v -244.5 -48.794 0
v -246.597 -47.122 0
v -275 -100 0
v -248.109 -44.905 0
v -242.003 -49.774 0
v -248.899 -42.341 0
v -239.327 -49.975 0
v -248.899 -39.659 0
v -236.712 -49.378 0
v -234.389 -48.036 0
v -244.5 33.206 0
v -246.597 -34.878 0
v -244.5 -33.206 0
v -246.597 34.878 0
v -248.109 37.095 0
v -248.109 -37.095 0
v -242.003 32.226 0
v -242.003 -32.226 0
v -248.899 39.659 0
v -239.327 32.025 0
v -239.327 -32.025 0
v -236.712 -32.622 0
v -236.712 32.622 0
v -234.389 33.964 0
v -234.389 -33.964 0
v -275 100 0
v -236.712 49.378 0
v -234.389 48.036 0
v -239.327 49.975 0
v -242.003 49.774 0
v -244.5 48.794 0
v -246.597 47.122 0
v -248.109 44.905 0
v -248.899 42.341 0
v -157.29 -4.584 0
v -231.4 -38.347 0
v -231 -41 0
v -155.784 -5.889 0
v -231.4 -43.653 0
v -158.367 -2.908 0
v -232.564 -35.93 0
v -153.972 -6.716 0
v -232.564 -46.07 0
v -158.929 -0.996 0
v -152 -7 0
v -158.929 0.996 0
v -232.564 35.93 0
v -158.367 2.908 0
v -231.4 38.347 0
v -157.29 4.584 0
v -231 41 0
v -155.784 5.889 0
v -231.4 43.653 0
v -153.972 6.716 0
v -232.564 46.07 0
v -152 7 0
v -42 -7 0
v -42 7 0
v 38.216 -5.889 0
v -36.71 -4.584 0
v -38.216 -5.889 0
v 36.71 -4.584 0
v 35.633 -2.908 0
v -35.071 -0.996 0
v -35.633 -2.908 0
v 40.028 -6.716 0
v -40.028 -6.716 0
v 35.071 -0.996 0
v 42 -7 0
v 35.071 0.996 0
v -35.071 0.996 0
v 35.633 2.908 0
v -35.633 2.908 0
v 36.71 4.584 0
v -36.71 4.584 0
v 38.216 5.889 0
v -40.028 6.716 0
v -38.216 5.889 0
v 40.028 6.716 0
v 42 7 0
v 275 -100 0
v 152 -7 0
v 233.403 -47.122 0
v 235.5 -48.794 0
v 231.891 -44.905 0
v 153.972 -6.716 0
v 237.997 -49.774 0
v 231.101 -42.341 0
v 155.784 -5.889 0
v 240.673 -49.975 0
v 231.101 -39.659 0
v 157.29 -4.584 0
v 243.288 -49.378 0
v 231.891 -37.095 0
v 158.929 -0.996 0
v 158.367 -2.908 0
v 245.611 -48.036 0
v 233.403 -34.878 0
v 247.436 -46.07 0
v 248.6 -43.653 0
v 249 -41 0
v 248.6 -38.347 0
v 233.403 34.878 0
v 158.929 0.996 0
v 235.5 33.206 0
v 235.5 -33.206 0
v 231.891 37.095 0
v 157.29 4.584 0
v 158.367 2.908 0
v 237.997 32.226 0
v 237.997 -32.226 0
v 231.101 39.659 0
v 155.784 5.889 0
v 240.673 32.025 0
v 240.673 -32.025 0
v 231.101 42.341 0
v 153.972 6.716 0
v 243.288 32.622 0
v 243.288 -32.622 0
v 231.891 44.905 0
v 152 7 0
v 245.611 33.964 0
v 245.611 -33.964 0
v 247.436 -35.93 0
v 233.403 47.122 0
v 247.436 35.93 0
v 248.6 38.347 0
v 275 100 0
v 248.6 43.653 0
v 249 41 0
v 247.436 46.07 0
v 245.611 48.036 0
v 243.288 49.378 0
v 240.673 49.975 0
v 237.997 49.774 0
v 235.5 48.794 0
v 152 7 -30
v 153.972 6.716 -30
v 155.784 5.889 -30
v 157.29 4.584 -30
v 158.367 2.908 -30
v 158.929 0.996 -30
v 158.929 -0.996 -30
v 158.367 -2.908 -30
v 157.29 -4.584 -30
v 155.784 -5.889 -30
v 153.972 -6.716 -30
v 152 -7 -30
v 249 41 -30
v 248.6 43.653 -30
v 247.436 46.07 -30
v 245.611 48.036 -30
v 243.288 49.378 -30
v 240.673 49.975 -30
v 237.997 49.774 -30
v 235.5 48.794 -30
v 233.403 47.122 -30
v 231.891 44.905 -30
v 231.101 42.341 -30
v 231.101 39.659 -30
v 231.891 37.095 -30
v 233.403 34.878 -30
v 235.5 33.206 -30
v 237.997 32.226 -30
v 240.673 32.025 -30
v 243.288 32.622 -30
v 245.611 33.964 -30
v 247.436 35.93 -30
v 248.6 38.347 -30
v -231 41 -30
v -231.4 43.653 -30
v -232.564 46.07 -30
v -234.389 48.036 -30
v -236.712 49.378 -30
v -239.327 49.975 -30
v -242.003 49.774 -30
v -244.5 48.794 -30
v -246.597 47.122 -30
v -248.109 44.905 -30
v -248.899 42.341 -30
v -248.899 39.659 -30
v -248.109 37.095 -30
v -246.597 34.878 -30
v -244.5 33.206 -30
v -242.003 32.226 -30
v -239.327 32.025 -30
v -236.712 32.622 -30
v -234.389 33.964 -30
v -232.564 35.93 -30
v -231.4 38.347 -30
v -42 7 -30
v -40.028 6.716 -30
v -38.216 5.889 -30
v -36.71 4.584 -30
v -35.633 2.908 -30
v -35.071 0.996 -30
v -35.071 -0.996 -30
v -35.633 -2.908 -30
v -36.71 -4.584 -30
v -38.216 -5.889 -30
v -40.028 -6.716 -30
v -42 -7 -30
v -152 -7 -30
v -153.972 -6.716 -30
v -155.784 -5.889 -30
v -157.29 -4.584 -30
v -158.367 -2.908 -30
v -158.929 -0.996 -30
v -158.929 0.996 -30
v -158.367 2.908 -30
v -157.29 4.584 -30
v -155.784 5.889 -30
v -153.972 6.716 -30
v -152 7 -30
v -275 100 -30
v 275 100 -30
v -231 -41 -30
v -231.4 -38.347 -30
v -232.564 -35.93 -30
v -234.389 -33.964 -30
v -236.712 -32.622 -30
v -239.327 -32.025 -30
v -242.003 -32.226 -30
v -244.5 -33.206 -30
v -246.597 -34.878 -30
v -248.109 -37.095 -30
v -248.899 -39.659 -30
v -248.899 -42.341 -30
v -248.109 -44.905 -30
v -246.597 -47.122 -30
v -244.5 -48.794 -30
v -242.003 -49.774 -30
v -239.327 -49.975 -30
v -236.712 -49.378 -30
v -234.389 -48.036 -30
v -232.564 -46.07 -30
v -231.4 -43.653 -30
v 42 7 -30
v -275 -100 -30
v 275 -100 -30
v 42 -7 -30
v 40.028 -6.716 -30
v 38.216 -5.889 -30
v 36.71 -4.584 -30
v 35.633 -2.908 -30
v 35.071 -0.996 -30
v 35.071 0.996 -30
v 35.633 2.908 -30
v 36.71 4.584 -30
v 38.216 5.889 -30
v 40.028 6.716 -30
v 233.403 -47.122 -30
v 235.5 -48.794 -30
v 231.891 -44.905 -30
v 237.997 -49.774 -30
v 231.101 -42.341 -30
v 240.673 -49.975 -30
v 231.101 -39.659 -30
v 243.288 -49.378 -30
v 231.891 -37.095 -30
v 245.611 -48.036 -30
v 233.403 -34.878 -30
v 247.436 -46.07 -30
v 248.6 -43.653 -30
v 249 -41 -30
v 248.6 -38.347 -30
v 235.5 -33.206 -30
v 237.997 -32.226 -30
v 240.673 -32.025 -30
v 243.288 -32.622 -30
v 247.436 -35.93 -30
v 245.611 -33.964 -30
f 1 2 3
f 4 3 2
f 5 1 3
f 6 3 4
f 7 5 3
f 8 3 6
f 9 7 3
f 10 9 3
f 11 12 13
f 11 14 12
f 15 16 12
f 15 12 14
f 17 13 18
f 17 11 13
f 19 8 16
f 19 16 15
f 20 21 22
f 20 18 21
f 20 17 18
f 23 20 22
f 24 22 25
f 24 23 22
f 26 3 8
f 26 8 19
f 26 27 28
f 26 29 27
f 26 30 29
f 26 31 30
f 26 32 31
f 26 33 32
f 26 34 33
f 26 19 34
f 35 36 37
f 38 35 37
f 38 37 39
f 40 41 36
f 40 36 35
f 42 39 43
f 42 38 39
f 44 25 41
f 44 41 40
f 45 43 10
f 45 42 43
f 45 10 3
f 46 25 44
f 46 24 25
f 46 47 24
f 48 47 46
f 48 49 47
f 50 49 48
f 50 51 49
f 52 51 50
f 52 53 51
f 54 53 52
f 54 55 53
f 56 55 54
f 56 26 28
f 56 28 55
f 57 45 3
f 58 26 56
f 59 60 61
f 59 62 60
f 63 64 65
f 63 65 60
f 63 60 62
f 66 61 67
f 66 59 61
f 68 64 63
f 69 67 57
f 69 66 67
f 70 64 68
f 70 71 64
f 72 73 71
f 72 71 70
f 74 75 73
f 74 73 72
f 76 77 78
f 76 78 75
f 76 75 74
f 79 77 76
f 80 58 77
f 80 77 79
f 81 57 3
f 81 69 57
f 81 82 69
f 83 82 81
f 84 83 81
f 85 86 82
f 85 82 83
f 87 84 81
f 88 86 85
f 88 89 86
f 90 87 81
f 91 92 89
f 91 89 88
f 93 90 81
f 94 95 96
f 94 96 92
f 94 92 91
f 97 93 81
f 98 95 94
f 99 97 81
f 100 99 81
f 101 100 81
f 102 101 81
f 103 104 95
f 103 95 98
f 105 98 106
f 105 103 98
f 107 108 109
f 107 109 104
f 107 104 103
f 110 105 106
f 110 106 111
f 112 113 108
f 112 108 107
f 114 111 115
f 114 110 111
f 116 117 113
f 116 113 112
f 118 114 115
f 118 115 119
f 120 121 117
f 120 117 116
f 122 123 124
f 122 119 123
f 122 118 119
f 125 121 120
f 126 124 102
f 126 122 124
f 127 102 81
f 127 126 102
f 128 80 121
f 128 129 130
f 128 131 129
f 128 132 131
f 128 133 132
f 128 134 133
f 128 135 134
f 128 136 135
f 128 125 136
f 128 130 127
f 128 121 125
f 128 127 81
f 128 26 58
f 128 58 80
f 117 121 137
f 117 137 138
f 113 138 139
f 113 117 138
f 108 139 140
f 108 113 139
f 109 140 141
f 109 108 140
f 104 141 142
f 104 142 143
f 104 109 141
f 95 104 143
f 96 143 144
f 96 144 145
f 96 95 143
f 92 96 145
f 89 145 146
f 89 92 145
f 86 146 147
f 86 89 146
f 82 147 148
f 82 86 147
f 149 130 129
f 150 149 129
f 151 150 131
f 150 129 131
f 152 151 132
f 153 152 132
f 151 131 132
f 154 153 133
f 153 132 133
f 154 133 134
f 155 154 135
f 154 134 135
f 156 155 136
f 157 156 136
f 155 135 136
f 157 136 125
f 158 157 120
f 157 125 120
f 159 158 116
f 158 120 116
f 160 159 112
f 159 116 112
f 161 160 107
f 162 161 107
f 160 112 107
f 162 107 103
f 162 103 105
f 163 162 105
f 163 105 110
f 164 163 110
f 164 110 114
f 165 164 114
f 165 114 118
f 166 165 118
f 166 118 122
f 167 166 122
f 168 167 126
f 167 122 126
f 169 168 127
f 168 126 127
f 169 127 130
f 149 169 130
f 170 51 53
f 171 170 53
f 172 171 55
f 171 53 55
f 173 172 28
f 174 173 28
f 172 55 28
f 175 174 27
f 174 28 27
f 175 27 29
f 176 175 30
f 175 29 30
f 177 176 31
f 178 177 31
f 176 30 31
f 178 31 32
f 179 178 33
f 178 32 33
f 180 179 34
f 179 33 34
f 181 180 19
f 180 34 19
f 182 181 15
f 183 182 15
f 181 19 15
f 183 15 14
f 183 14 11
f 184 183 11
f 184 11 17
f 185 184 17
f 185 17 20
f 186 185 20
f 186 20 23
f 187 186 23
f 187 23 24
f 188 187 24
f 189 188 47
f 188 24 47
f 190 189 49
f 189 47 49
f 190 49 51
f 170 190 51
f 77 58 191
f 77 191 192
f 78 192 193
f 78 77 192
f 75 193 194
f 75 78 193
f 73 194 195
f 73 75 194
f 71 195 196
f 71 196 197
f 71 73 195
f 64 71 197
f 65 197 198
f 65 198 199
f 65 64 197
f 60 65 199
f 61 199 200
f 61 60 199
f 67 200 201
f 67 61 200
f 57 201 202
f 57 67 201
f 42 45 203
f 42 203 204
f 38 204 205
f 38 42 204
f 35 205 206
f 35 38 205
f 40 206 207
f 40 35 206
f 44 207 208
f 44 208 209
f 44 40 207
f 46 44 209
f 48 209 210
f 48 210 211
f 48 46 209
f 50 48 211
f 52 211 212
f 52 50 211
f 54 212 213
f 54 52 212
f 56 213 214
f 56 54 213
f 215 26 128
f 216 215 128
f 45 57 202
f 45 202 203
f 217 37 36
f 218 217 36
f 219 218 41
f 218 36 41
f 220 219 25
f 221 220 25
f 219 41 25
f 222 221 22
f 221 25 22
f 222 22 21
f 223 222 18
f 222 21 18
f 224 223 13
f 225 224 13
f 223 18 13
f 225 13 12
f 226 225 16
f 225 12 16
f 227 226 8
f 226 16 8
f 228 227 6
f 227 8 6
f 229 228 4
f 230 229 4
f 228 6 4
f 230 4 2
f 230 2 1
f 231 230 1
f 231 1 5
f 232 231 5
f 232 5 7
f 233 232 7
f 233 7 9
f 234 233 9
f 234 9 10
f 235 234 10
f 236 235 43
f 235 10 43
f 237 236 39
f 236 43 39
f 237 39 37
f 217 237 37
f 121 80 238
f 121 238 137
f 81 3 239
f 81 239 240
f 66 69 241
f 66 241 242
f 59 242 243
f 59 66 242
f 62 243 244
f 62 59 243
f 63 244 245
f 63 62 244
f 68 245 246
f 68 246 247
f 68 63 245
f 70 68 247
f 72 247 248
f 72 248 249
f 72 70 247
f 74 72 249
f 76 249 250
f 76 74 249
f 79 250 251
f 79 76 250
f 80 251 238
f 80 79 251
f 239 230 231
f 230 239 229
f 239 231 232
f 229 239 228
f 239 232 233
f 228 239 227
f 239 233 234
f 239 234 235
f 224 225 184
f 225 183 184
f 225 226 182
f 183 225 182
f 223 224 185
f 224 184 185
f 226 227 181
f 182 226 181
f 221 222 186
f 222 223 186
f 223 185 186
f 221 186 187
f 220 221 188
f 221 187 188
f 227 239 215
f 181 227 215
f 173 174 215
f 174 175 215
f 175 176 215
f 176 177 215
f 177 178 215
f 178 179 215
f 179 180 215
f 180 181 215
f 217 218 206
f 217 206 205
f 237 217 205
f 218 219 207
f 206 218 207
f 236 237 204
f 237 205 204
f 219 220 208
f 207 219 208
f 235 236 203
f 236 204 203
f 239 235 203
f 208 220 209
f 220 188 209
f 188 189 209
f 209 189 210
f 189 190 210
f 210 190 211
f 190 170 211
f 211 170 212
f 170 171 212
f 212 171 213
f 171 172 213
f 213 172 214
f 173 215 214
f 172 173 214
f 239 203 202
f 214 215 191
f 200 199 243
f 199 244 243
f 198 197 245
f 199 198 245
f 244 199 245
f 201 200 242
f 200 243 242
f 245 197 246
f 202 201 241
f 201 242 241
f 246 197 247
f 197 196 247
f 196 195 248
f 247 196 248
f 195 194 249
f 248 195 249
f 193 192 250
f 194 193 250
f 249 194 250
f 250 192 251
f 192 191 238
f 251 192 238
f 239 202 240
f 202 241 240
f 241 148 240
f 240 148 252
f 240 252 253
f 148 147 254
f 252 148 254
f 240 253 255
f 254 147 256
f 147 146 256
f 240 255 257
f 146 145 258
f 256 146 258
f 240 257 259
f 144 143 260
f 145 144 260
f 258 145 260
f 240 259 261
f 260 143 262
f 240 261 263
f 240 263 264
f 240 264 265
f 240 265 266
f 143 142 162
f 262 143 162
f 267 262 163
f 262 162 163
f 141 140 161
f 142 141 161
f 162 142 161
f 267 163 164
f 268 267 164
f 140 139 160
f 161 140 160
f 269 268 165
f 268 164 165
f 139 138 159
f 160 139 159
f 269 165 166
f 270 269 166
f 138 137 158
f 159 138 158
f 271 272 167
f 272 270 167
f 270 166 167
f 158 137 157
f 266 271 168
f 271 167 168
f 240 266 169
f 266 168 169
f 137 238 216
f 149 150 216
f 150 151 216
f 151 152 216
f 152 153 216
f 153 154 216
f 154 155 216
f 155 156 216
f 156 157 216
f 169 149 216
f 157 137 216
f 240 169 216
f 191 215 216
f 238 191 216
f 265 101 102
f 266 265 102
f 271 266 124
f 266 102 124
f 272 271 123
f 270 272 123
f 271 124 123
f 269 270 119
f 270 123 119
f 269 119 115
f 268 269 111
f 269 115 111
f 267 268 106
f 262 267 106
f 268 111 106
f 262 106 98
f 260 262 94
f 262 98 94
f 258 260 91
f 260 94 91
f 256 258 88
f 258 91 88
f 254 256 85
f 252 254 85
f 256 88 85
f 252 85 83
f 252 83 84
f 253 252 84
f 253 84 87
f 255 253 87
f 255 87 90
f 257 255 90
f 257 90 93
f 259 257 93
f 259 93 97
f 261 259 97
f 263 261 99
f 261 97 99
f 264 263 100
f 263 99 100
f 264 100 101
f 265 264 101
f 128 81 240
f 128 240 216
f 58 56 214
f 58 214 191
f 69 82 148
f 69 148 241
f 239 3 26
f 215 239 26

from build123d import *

# Parameters (mm, degrees)
F0_W     = 550
F0_H     = 200
F0_R     = 9
F1_DEPTH = 30


with BuildPart() as f1:
    # F0 (on Top) → F1 (new body)
    with BuildSketch(Plane.XY):
        Rectangle(F0_W, F0_H)
        with Locations((-240, -41)):
            Circle(F0_R, mode=Mode.SUBTRACT)
        with Locations((240, -41)):
            Circle(F0_R, mode=Mode.SUBTRACT)
        with Locations((-240, 41)):
            Circle(F0_R, mode=Mode.SUBTRACT)
        with BuildLine():
            ThreePointArc((-42, 7), (-35, 0), (-42, -7))
            Line((-42, -7), (-152, -7))
            ThreePointArc((-152, -7), (-159, 0), (-152, 7))
            Line((-152, 7), (-42, 7))
        make_face(mode=Mode.SUBTRACT)
        with BuildLine():
            ThreePointArc((42, -7), (35, 0), (42, 7))
            Line((42, 7), (152, 7))
            ThreePointArc((152, 7), (159, 0), (152, -7))
            Line((152, -7), (42, -7))
        make_face(mode=Mode.SUBTRACT)
        with Locations((240, 41)):
            Circle(F0_R, mode=Mode.SUBTRACT)
    extrude(amount=-F1_DEPTH)


solid = f1.part
